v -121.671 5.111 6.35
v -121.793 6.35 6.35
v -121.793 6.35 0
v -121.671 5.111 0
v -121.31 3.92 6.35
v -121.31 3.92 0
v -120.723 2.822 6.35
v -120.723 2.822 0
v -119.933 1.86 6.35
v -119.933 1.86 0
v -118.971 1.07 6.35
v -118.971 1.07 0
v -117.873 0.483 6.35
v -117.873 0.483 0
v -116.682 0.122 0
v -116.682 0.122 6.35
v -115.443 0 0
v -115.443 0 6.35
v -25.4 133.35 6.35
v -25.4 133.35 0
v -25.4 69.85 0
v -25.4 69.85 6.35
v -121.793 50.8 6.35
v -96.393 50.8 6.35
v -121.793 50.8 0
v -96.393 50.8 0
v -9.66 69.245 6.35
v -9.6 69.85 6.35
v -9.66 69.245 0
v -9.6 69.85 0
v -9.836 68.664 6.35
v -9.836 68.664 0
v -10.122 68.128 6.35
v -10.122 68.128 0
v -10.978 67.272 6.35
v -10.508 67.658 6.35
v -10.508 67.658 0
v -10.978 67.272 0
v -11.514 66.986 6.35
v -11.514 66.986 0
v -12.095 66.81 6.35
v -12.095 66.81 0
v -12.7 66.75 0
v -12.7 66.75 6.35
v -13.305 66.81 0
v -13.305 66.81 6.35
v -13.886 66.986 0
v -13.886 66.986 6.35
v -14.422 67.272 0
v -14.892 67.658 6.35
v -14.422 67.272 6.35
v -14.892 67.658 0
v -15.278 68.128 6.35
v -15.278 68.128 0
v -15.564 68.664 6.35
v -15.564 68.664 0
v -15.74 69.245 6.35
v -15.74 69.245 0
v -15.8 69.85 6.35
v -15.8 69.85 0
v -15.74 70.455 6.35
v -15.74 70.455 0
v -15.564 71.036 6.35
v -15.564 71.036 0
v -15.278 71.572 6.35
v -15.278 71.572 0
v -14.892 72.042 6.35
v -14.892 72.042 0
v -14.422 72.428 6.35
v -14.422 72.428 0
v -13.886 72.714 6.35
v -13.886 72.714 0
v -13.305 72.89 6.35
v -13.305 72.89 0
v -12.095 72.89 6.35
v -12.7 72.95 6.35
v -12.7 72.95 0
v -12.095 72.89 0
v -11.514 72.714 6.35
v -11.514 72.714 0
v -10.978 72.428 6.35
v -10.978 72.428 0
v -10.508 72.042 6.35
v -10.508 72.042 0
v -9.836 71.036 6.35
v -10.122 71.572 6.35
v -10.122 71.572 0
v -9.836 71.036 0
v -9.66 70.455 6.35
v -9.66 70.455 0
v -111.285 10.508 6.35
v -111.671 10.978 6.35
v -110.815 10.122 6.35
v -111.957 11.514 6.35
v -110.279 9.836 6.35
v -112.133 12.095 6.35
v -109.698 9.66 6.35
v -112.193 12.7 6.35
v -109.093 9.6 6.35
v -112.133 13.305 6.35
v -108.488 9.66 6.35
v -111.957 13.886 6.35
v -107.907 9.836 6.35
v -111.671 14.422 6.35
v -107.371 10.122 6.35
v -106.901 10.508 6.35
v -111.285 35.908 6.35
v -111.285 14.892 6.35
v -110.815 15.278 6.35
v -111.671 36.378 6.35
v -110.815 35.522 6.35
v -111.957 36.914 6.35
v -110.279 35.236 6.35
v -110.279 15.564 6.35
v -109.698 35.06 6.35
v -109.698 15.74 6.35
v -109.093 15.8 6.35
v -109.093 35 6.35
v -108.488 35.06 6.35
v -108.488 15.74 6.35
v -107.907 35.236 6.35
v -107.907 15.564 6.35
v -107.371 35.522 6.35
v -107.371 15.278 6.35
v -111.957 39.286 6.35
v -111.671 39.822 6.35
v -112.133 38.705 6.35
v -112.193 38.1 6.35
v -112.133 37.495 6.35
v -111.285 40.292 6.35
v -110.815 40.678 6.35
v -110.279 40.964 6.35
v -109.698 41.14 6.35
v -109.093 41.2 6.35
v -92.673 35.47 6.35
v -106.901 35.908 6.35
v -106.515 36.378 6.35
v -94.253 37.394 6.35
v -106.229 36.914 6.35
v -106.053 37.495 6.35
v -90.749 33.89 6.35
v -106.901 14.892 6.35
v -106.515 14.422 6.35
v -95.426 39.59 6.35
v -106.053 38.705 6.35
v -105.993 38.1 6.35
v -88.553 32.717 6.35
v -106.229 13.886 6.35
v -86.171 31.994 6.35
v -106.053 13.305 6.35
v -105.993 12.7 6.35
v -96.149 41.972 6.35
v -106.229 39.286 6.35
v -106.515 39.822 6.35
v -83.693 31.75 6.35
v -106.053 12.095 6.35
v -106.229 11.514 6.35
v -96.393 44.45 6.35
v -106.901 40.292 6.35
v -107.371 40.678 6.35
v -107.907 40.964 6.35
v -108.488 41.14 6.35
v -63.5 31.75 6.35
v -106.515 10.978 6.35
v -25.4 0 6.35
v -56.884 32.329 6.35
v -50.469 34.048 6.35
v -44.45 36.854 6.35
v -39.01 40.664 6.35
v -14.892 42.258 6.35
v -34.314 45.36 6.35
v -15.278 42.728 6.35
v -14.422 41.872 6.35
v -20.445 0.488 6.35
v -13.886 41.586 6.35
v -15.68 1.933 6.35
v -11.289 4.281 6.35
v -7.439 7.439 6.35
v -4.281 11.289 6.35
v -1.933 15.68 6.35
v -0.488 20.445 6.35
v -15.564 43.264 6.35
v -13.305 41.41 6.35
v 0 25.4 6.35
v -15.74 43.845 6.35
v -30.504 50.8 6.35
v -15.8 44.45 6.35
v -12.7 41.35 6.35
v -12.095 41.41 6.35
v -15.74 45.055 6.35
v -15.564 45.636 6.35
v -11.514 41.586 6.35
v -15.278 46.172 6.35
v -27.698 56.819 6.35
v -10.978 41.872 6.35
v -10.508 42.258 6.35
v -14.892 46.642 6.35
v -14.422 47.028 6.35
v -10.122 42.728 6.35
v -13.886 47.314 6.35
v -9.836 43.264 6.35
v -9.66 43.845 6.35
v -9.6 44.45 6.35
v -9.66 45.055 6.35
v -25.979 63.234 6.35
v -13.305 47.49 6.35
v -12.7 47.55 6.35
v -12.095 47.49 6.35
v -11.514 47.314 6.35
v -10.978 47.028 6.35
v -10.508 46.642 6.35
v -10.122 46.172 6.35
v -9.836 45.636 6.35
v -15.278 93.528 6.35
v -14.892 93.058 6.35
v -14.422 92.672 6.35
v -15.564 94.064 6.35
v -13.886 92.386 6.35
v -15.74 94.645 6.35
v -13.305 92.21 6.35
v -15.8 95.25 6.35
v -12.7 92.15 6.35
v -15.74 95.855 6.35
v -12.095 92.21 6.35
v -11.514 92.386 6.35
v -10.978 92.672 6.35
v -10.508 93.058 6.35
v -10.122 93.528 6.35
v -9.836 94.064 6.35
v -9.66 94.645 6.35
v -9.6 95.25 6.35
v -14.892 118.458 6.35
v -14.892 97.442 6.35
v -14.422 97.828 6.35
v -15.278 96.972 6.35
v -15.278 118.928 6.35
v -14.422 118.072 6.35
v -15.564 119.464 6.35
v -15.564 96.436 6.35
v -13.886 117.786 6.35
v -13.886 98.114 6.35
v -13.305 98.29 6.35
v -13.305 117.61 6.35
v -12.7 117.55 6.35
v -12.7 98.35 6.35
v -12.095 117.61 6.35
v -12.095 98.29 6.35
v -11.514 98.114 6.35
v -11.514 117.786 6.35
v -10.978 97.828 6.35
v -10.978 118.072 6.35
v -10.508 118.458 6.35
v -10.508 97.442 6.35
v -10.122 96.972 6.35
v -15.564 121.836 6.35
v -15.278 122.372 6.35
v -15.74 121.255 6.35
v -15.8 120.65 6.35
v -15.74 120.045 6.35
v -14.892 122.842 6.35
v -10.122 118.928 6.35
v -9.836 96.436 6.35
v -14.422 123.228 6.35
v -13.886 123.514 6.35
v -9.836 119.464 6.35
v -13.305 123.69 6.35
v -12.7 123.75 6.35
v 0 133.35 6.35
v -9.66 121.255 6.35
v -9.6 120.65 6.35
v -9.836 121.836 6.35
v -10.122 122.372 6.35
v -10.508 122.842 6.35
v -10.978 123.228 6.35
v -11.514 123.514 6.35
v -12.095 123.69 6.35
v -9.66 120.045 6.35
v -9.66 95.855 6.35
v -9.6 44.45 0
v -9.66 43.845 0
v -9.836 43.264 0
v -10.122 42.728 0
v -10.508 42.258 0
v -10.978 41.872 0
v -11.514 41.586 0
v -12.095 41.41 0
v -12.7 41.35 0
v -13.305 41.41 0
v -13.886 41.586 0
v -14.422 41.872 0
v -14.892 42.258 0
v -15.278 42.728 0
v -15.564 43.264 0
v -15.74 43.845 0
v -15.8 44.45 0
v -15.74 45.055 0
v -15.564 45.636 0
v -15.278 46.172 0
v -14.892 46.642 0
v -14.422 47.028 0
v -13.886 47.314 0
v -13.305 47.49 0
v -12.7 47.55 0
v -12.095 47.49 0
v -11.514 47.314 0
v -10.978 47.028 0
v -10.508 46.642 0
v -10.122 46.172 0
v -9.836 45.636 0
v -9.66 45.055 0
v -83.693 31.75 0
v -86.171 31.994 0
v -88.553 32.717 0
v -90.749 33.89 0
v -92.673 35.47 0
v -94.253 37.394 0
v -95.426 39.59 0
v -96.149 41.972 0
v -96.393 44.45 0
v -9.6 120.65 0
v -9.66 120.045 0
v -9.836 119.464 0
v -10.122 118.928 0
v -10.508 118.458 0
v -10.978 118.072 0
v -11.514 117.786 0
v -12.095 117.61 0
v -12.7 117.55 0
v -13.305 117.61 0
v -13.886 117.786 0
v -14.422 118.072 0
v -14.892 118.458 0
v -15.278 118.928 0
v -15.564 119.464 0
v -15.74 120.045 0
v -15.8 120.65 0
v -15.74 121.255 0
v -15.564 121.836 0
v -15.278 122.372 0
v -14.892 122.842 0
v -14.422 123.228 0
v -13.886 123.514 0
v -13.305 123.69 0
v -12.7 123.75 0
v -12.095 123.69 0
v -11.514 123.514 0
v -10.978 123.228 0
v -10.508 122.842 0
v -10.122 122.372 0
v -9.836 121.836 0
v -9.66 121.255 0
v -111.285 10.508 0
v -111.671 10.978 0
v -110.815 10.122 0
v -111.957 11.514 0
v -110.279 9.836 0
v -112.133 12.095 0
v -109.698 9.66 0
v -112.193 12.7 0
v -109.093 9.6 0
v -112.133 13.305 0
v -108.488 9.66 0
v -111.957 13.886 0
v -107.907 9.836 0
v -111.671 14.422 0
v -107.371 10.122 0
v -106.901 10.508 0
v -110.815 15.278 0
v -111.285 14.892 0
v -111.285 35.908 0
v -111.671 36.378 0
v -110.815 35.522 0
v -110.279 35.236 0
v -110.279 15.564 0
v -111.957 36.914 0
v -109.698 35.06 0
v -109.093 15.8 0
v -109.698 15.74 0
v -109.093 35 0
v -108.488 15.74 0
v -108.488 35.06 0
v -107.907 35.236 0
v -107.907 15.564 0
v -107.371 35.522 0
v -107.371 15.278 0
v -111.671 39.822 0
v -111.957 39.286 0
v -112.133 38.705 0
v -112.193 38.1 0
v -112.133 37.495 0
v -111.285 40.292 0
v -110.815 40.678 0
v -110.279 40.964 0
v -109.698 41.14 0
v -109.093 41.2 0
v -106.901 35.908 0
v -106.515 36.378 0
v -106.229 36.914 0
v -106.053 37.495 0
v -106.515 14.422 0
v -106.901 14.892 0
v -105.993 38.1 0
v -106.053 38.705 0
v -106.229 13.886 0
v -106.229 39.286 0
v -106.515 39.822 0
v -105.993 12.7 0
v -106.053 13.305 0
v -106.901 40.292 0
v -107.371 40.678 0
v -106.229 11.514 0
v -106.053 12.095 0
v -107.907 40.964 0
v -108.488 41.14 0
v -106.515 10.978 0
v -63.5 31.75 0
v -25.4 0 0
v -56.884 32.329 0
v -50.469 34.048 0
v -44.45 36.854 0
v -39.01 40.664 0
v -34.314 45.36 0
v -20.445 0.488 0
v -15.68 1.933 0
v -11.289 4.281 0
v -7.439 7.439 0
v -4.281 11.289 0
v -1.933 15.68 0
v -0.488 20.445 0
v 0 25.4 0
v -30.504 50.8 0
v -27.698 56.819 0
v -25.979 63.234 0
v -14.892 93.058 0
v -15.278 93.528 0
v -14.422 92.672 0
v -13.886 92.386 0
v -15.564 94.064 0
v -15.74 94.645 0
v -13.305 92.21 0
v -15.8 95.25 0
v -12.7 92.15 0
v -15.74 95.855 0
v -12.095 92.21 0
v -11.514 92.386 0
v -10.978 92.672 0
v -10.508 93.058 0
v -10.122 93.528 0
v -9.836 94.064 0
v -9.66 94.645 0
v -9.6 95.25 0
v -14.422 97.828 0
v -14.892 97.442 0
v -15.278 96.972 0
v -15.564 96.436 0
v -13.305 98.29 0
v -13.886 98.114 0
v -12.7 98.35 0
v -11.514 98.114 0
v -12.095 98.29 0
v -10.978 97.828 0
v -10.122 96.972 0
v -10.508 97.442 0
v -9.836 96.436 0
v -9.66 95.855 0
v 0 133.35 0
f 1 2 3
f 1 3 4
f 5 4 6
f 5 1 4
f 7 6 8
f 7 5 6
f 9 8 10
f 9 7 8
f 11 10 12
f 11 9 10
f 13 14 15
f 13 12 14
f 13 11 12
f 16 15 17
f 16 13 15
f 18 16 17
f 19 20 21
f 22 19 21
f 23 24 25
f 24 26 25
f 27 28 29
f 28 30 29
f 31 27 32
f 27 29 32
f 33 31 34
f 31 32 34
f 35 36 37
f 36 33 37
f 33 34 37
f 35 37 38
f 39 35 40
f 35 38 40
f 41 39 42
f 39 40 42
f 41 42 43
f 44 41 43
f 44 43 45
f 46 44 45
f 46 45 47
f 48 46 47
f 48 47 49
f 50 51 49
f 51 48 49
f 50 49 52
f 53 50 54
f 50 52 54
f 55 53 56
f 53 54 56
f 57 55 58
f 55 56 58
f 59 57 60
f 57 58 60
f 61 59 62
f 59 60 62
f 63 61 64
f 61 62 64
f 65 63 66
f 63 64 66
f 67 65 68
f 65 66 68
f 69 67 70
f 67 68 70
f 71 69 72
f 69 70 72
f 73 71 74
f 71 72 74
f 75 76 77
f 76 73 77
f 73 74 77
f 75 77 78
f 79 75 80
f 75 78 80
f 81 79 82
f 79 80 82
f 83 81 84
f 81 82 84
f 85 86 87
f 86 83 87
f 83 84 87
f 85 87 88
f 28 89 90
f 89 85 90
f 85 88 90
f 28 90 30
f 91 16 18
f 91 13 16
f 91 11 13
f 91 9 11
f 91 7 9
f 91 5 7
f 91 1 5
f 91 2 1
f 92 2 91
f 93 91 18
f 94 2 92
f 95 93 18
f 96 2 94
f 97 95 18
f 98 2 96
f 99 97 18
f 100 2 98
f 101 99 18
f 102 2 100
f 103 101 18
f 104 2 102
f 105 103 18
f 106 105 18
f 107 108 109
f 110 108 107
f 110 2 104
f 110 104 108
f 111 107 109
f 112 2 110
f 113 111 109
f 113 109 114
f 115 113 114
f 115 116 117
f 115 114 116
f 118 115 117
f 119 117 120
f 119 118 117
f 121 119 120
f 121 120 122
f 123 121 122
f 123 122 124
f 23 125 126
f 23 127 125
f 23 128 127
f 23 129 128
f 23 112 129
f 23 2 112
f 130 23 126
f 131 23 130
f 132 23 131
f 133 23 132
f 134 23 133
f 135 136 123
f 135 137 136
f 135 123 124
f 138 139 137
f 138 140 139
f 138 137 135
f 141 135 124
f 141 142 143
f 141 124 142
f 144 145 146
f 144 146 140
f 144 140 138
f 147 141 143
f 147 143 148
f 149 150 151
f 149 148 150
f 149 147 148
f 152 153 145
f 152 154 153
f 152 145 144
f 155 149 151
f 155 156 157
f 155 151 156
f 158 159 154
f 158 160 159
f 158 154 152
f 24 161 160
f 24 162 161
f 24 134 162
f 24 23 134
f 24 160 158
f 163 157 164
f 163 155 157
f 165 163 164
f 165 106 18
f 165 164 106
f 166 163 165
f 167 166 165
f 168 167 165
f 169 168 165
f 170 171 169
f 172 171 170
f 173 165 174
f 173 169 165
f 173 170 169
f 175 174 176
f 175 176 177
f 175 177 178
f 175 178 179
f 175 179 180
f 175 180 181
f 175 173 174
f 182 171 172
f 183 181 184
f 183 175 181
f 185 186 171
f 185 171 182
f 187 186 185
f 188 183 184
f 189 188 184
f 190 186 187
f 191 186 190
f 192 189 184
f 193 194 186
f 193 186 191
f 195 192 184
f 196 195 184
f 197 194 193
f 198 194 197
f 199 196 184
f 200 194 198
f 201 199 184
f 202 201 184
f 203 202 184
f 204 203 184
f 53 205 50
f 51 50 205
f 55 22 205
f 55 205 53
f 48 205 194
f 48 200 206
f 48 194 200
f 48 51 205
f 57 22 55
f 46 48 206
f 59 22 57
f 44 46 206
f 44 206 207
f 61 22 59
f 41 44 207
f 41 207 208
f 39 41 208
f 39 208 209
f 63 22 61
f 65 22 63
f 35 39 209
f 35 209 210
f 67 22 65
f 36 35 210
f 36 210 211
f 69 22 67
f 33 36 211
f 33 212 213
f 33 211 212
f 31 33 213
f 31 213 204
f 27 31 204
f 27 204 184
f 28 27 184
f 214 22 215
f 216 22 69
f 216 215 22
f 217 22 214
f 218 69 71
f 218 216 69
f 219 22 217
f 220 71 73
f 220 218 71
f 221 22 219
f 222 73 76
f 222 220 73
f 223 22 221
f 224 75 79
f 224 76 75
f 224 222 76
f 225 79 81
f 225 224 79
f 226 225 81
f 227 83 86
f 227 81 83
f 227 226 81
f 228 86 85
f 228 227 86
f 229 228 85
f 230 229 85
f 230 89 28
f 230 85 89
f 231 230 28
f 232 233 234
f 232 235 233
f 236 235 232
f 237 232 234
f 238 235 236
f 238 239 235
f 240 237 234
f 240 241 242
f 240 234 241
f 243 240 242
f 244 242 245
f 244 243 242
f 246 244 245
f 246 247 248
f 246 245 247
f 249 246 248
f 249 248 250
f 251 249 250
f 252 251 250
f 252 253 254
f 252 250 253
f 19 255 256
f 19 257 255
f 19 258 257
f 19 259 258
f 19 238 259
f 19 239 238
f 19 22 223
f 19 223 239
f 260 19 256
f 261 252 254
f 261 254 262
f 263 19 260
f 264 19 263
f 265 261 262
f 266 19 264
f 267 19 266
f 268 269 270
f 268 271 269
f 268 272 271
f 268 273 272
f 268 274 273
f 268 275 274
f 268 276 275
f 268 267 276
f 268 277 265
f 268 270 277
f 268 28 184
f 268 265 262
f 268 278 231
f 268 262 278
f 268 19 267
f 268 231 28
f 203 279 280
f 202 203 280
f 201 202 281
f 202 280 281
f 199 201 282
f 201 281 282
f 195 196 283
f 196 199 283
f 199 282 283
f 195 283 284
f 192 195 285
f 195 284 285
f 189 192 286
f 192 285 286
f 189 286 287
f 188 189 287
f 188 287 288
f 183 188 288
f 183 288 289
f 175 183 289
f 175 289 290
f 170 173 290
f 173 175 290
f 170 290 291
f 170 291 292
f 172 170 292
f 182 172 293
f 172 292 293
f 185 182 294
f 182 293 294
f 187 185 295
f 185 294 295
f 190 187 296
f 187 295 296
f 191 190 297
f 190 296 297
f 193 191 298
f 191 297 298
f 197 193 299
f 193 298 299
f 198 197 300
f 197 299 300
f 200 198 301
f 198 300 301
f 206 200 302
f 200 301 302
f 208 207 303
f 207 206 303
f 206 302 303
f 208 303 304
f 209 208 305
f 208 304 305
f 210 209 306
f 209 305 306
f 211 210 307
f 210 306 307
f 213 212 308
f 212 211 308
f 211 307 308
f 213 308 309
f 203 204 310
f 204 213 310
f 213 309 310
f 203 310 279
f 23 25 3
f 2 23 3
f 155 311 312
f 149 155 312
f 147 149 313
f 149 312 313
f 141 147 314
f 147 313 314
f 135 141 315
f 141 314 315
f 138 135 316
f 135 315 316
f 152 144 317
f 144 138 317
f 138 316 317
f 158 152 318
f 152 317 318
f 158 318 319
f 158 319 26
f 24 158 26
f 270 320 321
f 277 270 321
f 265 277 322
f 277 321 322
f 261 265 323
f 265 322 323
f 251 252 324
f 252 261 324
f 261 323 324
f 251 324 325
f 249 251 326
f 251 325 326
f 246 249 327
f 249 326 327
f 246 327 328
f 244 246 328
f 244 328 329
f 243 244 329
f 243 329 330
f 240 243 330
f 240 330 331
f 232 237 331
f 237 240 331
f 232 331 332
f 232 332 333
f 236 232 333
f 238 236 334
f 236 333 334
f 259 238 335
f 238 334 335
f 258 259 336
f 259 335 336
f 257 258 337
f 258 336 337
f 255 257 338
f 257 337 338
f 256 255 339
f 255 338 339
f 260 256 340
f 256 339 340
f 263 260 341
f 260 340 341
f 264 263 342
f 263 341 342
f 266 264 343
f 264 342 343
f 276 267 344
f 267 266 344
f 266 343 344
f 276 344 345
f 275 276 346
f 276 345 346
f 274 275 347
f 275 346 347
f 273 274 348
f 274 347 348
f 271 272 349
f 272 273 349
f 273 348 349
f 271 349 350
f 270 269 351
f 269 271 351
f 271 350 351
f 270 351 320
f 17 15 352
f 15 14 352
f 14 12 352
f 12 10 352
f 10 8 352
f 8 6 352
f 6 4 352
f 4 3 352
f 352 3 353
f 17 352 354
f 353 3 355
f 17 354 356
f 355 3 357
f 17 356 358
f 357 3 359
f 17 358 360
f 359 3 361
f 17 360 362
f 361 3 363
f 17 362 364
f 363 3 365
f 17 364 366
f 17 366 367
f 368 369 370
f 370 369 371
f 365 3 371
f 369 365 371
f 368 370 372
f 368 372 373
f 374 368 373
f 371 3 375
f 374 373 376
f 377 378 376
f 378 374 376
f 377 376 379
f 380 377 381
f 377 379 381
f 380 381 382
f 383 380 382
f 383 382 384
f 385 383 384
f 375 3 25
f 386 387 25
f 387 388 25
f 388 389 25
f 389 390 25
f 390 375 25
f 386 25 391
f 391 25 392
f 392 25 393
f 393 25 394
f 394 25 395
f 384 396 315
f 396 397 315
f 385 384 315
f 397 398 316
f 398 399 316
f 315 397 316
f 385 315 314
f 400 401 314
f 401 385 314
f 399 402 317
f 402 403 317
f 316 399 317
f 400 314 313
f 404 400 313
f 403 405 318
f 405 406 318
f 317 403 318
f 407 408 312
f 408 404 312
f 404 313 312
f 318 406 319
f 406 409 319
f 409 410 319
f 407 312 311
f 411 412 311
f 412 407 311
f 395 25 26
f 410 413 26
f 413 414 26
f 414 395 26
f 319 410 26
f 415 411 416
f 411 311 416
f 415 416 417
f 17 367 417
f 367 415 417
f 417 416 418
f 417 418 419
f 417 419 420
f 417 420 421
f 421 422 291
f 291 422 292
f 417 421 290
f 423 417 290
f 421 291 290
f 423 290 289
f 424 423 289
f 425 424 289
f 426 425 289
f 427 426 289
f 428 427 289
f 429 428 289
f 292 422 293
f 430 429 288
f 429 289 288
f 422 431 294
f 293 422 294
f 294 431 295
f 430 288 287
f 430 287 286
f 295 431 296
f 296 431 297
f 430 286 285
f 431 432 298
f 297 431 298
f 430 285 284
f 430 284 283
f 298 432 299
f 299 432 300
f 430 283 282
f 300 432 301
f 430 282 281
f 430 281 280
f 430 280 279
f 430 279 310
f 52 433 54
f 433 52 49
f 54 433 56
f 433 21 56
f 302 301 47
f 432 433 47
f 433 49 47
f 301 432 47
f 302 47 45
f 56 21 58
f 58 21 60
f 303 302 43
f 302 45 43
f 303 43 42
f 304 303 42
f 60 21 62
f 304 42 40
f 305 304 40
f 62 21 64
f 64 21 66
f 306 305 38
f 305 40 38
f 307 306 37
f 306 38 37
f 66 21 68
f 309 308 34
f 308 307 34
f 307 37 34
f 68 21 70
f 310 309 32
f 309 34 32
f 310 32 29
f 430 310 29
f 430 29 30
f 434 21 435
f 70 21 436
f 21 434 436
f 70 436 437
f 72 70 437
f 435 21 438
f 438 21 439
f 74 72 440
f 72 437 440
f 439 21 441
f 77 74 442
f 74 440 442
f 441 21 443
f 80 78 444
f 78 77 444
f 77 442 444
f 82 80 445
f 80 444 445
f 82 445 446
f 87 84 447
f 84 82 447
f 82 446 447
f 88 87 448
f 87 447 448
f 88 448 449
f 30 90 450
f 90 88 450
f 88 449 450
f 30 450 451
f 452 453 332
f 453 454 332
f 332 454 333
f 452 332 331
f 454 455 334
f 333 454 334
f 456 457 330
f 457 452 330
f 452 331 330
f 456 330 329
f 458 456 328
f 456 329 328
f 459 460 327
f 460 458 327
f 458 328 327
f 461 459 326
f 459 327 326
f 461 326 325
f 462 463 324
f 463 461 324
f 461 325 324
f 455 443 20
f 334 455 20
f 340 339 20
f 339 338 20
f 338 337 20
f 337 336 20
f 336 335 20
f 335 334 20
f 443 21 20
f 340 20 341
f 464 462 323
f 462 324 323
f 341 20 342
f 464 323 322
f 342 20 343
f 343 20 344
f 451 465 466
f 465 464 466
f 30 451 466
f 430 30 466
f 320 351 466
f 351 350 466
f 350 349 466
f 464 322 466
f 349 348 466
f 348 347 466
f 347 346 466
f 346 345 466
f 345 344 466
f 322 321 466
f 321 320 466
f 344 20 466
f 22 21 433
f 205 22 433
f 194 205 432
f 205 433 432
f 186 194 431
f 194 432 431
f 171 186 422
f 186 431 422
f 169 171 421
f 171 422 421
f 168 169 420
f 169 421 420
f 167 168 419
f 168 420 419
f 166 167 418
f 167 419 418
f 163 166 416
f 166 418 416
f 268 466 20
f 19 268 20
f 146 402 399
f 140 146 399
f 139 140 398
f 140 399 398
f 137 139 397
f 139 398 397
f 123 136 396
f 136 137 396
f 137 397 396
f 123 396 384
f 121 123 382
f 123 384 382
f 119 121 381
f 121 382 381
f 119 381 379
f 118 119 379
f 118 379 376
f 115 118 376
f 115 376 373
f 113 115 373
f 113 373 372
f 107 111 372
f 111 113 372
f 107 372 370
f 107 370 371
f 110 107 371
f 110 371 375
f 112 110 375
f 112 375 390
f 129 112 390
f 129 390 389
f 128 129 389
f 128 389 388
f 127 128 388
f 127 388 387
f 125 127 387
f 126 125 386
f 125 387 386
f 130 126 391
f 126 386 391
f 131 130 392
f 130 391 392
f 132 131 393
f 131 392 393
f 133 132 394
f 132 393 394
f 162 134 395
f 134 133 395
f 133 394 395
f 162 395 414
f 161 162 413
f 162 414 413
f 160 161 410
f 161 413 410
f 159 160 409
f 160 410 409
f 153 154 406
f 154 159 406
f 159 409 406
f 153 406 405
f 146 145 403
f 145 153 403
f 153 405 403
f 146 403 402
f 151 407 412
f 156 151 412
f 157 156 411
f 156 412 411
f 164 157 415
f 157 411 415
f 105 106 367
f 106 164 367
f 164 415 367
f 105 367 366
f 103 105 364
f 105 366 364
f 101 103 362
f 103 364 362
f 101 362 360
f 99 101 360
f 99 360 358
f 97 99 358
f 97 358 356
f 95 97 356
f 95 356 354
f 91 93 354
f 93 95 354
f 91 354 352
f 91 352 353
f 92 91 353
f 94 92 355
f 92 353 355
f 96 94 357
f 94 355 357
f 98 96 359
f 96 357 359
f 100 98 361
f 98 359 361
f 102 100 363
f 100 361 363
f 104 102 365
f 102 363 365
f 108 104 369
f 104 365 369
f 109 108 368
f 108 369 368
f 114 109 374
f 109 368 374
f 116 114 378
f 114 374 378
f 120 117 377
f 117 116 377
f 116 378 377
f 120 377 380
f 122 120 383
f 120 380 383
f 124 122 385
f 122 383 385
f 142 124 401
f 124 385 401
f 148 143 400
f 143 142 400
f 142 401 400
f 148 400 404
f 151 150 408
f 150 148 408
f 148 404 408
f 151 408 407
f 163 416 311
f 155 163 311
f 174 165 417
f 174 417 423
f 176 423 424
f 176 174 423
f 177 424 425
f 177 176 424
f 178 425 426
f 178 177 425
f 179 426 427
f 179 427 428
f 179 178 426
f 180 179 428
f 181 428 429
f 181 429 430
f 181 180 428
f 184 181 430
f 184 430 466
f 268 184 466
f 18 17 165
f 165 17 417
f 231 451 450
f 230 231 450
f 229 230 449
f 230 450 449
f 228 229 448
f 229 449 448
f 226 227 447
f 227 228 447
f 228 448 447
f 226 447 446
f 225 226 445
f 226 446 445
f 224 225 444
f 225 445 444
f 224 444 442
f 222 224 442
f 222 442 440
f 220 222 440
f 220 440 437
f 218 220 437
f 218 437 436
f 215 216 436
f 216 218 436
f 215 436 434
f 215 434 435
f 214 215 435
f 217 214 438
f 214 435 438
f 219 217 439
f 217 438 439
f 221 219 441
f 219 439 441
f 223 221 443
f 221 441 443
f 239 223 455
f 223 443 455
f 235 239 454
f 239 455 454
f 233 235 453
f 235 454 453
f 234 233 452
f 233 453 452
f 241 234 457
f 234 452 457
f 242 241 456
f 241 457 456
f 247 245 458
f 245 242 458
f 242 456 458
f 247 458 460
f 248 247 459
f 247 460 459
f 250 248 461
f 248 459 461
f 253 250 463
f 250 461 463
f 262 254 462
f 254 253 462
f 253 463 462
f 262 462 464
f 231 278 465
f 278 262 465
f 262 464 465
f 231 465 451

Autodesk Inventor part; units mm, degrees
ref_plane "YZ Plane" through (0, 0, 0) normal (1, 0, 0) x (0, 1, 0)
ref_plane "XZ Plane" through (0, 0, 0) normal (0, 1, 0) x (-1, 0, 0)
ref_plane "XY Plane" through (0, 0, 0) normal (0, 0, 1) x (1, 0, 0)
sketch "Sketch1" plane through (0, 0, 0) normal (0, 0, 1) x (1, 0, 0)
  line L0 (0, 0) -> (0, 133.35)
  line L1 (0, 133.35) -> (-25.4, 133.35)
  line L2 (-25.4, 133.35) -> (-25.4, 69.85)
  line L3 (-63.5, 31.75) -> (-83.693, 31.75)
  line L4 (-96.393, 44.45) -> (-96.393, 50.8)
  line L5 (-96.393, 50.8) -> (-121.793, 50.8)
  line L6 (-121.793, 50.8) -> (-121.793, 0)
  line L7 (-121.793, 0) -> (0, 0)
  arc A0 (-96.393, 44.45) -> (-83.693, 31.75) centre (-83.693, 44.45) ccw
  arc A1 (-63.5, 31.75) -> (-25.4, 69.85) centre (-63.5, 69.85) ccw
  circle A2 centre (-12.7, 120.65) radius 3.1
  circle A3 centre (-12.7, 95.25) radius 3.1
  circle A4 centre (-12.7, 69.85) radius 3.1
  circle A5 centre (-12.7, 44.45) radius 3.1
  circle A6 centre (-109.093, 38.1) radius 3.1
  circle A7 centre (-109.093, 12.7) radius 3.1
  point P0 (-25.4, 31.75)
  point P1 (-96.393, 31.75)
  dimension "d0" = 133.35
  dimension "d1" = 25.4
  dimension "d2" = 101.6
  dimension "d3" = 70.993
  dimension "d4" = 19.05
  dimension "d5" = 25.4
  dimension "d6" = 12.7
  dimension "d7" = 38.1
  dimension "d8" = 6.2
  dimension "d9" = 12.7
  dimension "d10" = 12.7
  dimension "d13" = 25.4
  dimension "d18" = 6.2
  dimension "d19" = 12.7
  dimension "d20" = 12.7
  dimension "d21" = 6.2
  dimension "d22" = 25.4
extrude "Extrusion1" add sketch "Sketch1" along normal blind 6.35
fillet "Fillet1" radius 25.4 1 edges at (0, 0, 3.175)
fillet "Fillet2" radius 6.35 1 edges at (-121.793, 0, 3.175)
properties part number "sidethrustalum" material "Aluminum 6061"
